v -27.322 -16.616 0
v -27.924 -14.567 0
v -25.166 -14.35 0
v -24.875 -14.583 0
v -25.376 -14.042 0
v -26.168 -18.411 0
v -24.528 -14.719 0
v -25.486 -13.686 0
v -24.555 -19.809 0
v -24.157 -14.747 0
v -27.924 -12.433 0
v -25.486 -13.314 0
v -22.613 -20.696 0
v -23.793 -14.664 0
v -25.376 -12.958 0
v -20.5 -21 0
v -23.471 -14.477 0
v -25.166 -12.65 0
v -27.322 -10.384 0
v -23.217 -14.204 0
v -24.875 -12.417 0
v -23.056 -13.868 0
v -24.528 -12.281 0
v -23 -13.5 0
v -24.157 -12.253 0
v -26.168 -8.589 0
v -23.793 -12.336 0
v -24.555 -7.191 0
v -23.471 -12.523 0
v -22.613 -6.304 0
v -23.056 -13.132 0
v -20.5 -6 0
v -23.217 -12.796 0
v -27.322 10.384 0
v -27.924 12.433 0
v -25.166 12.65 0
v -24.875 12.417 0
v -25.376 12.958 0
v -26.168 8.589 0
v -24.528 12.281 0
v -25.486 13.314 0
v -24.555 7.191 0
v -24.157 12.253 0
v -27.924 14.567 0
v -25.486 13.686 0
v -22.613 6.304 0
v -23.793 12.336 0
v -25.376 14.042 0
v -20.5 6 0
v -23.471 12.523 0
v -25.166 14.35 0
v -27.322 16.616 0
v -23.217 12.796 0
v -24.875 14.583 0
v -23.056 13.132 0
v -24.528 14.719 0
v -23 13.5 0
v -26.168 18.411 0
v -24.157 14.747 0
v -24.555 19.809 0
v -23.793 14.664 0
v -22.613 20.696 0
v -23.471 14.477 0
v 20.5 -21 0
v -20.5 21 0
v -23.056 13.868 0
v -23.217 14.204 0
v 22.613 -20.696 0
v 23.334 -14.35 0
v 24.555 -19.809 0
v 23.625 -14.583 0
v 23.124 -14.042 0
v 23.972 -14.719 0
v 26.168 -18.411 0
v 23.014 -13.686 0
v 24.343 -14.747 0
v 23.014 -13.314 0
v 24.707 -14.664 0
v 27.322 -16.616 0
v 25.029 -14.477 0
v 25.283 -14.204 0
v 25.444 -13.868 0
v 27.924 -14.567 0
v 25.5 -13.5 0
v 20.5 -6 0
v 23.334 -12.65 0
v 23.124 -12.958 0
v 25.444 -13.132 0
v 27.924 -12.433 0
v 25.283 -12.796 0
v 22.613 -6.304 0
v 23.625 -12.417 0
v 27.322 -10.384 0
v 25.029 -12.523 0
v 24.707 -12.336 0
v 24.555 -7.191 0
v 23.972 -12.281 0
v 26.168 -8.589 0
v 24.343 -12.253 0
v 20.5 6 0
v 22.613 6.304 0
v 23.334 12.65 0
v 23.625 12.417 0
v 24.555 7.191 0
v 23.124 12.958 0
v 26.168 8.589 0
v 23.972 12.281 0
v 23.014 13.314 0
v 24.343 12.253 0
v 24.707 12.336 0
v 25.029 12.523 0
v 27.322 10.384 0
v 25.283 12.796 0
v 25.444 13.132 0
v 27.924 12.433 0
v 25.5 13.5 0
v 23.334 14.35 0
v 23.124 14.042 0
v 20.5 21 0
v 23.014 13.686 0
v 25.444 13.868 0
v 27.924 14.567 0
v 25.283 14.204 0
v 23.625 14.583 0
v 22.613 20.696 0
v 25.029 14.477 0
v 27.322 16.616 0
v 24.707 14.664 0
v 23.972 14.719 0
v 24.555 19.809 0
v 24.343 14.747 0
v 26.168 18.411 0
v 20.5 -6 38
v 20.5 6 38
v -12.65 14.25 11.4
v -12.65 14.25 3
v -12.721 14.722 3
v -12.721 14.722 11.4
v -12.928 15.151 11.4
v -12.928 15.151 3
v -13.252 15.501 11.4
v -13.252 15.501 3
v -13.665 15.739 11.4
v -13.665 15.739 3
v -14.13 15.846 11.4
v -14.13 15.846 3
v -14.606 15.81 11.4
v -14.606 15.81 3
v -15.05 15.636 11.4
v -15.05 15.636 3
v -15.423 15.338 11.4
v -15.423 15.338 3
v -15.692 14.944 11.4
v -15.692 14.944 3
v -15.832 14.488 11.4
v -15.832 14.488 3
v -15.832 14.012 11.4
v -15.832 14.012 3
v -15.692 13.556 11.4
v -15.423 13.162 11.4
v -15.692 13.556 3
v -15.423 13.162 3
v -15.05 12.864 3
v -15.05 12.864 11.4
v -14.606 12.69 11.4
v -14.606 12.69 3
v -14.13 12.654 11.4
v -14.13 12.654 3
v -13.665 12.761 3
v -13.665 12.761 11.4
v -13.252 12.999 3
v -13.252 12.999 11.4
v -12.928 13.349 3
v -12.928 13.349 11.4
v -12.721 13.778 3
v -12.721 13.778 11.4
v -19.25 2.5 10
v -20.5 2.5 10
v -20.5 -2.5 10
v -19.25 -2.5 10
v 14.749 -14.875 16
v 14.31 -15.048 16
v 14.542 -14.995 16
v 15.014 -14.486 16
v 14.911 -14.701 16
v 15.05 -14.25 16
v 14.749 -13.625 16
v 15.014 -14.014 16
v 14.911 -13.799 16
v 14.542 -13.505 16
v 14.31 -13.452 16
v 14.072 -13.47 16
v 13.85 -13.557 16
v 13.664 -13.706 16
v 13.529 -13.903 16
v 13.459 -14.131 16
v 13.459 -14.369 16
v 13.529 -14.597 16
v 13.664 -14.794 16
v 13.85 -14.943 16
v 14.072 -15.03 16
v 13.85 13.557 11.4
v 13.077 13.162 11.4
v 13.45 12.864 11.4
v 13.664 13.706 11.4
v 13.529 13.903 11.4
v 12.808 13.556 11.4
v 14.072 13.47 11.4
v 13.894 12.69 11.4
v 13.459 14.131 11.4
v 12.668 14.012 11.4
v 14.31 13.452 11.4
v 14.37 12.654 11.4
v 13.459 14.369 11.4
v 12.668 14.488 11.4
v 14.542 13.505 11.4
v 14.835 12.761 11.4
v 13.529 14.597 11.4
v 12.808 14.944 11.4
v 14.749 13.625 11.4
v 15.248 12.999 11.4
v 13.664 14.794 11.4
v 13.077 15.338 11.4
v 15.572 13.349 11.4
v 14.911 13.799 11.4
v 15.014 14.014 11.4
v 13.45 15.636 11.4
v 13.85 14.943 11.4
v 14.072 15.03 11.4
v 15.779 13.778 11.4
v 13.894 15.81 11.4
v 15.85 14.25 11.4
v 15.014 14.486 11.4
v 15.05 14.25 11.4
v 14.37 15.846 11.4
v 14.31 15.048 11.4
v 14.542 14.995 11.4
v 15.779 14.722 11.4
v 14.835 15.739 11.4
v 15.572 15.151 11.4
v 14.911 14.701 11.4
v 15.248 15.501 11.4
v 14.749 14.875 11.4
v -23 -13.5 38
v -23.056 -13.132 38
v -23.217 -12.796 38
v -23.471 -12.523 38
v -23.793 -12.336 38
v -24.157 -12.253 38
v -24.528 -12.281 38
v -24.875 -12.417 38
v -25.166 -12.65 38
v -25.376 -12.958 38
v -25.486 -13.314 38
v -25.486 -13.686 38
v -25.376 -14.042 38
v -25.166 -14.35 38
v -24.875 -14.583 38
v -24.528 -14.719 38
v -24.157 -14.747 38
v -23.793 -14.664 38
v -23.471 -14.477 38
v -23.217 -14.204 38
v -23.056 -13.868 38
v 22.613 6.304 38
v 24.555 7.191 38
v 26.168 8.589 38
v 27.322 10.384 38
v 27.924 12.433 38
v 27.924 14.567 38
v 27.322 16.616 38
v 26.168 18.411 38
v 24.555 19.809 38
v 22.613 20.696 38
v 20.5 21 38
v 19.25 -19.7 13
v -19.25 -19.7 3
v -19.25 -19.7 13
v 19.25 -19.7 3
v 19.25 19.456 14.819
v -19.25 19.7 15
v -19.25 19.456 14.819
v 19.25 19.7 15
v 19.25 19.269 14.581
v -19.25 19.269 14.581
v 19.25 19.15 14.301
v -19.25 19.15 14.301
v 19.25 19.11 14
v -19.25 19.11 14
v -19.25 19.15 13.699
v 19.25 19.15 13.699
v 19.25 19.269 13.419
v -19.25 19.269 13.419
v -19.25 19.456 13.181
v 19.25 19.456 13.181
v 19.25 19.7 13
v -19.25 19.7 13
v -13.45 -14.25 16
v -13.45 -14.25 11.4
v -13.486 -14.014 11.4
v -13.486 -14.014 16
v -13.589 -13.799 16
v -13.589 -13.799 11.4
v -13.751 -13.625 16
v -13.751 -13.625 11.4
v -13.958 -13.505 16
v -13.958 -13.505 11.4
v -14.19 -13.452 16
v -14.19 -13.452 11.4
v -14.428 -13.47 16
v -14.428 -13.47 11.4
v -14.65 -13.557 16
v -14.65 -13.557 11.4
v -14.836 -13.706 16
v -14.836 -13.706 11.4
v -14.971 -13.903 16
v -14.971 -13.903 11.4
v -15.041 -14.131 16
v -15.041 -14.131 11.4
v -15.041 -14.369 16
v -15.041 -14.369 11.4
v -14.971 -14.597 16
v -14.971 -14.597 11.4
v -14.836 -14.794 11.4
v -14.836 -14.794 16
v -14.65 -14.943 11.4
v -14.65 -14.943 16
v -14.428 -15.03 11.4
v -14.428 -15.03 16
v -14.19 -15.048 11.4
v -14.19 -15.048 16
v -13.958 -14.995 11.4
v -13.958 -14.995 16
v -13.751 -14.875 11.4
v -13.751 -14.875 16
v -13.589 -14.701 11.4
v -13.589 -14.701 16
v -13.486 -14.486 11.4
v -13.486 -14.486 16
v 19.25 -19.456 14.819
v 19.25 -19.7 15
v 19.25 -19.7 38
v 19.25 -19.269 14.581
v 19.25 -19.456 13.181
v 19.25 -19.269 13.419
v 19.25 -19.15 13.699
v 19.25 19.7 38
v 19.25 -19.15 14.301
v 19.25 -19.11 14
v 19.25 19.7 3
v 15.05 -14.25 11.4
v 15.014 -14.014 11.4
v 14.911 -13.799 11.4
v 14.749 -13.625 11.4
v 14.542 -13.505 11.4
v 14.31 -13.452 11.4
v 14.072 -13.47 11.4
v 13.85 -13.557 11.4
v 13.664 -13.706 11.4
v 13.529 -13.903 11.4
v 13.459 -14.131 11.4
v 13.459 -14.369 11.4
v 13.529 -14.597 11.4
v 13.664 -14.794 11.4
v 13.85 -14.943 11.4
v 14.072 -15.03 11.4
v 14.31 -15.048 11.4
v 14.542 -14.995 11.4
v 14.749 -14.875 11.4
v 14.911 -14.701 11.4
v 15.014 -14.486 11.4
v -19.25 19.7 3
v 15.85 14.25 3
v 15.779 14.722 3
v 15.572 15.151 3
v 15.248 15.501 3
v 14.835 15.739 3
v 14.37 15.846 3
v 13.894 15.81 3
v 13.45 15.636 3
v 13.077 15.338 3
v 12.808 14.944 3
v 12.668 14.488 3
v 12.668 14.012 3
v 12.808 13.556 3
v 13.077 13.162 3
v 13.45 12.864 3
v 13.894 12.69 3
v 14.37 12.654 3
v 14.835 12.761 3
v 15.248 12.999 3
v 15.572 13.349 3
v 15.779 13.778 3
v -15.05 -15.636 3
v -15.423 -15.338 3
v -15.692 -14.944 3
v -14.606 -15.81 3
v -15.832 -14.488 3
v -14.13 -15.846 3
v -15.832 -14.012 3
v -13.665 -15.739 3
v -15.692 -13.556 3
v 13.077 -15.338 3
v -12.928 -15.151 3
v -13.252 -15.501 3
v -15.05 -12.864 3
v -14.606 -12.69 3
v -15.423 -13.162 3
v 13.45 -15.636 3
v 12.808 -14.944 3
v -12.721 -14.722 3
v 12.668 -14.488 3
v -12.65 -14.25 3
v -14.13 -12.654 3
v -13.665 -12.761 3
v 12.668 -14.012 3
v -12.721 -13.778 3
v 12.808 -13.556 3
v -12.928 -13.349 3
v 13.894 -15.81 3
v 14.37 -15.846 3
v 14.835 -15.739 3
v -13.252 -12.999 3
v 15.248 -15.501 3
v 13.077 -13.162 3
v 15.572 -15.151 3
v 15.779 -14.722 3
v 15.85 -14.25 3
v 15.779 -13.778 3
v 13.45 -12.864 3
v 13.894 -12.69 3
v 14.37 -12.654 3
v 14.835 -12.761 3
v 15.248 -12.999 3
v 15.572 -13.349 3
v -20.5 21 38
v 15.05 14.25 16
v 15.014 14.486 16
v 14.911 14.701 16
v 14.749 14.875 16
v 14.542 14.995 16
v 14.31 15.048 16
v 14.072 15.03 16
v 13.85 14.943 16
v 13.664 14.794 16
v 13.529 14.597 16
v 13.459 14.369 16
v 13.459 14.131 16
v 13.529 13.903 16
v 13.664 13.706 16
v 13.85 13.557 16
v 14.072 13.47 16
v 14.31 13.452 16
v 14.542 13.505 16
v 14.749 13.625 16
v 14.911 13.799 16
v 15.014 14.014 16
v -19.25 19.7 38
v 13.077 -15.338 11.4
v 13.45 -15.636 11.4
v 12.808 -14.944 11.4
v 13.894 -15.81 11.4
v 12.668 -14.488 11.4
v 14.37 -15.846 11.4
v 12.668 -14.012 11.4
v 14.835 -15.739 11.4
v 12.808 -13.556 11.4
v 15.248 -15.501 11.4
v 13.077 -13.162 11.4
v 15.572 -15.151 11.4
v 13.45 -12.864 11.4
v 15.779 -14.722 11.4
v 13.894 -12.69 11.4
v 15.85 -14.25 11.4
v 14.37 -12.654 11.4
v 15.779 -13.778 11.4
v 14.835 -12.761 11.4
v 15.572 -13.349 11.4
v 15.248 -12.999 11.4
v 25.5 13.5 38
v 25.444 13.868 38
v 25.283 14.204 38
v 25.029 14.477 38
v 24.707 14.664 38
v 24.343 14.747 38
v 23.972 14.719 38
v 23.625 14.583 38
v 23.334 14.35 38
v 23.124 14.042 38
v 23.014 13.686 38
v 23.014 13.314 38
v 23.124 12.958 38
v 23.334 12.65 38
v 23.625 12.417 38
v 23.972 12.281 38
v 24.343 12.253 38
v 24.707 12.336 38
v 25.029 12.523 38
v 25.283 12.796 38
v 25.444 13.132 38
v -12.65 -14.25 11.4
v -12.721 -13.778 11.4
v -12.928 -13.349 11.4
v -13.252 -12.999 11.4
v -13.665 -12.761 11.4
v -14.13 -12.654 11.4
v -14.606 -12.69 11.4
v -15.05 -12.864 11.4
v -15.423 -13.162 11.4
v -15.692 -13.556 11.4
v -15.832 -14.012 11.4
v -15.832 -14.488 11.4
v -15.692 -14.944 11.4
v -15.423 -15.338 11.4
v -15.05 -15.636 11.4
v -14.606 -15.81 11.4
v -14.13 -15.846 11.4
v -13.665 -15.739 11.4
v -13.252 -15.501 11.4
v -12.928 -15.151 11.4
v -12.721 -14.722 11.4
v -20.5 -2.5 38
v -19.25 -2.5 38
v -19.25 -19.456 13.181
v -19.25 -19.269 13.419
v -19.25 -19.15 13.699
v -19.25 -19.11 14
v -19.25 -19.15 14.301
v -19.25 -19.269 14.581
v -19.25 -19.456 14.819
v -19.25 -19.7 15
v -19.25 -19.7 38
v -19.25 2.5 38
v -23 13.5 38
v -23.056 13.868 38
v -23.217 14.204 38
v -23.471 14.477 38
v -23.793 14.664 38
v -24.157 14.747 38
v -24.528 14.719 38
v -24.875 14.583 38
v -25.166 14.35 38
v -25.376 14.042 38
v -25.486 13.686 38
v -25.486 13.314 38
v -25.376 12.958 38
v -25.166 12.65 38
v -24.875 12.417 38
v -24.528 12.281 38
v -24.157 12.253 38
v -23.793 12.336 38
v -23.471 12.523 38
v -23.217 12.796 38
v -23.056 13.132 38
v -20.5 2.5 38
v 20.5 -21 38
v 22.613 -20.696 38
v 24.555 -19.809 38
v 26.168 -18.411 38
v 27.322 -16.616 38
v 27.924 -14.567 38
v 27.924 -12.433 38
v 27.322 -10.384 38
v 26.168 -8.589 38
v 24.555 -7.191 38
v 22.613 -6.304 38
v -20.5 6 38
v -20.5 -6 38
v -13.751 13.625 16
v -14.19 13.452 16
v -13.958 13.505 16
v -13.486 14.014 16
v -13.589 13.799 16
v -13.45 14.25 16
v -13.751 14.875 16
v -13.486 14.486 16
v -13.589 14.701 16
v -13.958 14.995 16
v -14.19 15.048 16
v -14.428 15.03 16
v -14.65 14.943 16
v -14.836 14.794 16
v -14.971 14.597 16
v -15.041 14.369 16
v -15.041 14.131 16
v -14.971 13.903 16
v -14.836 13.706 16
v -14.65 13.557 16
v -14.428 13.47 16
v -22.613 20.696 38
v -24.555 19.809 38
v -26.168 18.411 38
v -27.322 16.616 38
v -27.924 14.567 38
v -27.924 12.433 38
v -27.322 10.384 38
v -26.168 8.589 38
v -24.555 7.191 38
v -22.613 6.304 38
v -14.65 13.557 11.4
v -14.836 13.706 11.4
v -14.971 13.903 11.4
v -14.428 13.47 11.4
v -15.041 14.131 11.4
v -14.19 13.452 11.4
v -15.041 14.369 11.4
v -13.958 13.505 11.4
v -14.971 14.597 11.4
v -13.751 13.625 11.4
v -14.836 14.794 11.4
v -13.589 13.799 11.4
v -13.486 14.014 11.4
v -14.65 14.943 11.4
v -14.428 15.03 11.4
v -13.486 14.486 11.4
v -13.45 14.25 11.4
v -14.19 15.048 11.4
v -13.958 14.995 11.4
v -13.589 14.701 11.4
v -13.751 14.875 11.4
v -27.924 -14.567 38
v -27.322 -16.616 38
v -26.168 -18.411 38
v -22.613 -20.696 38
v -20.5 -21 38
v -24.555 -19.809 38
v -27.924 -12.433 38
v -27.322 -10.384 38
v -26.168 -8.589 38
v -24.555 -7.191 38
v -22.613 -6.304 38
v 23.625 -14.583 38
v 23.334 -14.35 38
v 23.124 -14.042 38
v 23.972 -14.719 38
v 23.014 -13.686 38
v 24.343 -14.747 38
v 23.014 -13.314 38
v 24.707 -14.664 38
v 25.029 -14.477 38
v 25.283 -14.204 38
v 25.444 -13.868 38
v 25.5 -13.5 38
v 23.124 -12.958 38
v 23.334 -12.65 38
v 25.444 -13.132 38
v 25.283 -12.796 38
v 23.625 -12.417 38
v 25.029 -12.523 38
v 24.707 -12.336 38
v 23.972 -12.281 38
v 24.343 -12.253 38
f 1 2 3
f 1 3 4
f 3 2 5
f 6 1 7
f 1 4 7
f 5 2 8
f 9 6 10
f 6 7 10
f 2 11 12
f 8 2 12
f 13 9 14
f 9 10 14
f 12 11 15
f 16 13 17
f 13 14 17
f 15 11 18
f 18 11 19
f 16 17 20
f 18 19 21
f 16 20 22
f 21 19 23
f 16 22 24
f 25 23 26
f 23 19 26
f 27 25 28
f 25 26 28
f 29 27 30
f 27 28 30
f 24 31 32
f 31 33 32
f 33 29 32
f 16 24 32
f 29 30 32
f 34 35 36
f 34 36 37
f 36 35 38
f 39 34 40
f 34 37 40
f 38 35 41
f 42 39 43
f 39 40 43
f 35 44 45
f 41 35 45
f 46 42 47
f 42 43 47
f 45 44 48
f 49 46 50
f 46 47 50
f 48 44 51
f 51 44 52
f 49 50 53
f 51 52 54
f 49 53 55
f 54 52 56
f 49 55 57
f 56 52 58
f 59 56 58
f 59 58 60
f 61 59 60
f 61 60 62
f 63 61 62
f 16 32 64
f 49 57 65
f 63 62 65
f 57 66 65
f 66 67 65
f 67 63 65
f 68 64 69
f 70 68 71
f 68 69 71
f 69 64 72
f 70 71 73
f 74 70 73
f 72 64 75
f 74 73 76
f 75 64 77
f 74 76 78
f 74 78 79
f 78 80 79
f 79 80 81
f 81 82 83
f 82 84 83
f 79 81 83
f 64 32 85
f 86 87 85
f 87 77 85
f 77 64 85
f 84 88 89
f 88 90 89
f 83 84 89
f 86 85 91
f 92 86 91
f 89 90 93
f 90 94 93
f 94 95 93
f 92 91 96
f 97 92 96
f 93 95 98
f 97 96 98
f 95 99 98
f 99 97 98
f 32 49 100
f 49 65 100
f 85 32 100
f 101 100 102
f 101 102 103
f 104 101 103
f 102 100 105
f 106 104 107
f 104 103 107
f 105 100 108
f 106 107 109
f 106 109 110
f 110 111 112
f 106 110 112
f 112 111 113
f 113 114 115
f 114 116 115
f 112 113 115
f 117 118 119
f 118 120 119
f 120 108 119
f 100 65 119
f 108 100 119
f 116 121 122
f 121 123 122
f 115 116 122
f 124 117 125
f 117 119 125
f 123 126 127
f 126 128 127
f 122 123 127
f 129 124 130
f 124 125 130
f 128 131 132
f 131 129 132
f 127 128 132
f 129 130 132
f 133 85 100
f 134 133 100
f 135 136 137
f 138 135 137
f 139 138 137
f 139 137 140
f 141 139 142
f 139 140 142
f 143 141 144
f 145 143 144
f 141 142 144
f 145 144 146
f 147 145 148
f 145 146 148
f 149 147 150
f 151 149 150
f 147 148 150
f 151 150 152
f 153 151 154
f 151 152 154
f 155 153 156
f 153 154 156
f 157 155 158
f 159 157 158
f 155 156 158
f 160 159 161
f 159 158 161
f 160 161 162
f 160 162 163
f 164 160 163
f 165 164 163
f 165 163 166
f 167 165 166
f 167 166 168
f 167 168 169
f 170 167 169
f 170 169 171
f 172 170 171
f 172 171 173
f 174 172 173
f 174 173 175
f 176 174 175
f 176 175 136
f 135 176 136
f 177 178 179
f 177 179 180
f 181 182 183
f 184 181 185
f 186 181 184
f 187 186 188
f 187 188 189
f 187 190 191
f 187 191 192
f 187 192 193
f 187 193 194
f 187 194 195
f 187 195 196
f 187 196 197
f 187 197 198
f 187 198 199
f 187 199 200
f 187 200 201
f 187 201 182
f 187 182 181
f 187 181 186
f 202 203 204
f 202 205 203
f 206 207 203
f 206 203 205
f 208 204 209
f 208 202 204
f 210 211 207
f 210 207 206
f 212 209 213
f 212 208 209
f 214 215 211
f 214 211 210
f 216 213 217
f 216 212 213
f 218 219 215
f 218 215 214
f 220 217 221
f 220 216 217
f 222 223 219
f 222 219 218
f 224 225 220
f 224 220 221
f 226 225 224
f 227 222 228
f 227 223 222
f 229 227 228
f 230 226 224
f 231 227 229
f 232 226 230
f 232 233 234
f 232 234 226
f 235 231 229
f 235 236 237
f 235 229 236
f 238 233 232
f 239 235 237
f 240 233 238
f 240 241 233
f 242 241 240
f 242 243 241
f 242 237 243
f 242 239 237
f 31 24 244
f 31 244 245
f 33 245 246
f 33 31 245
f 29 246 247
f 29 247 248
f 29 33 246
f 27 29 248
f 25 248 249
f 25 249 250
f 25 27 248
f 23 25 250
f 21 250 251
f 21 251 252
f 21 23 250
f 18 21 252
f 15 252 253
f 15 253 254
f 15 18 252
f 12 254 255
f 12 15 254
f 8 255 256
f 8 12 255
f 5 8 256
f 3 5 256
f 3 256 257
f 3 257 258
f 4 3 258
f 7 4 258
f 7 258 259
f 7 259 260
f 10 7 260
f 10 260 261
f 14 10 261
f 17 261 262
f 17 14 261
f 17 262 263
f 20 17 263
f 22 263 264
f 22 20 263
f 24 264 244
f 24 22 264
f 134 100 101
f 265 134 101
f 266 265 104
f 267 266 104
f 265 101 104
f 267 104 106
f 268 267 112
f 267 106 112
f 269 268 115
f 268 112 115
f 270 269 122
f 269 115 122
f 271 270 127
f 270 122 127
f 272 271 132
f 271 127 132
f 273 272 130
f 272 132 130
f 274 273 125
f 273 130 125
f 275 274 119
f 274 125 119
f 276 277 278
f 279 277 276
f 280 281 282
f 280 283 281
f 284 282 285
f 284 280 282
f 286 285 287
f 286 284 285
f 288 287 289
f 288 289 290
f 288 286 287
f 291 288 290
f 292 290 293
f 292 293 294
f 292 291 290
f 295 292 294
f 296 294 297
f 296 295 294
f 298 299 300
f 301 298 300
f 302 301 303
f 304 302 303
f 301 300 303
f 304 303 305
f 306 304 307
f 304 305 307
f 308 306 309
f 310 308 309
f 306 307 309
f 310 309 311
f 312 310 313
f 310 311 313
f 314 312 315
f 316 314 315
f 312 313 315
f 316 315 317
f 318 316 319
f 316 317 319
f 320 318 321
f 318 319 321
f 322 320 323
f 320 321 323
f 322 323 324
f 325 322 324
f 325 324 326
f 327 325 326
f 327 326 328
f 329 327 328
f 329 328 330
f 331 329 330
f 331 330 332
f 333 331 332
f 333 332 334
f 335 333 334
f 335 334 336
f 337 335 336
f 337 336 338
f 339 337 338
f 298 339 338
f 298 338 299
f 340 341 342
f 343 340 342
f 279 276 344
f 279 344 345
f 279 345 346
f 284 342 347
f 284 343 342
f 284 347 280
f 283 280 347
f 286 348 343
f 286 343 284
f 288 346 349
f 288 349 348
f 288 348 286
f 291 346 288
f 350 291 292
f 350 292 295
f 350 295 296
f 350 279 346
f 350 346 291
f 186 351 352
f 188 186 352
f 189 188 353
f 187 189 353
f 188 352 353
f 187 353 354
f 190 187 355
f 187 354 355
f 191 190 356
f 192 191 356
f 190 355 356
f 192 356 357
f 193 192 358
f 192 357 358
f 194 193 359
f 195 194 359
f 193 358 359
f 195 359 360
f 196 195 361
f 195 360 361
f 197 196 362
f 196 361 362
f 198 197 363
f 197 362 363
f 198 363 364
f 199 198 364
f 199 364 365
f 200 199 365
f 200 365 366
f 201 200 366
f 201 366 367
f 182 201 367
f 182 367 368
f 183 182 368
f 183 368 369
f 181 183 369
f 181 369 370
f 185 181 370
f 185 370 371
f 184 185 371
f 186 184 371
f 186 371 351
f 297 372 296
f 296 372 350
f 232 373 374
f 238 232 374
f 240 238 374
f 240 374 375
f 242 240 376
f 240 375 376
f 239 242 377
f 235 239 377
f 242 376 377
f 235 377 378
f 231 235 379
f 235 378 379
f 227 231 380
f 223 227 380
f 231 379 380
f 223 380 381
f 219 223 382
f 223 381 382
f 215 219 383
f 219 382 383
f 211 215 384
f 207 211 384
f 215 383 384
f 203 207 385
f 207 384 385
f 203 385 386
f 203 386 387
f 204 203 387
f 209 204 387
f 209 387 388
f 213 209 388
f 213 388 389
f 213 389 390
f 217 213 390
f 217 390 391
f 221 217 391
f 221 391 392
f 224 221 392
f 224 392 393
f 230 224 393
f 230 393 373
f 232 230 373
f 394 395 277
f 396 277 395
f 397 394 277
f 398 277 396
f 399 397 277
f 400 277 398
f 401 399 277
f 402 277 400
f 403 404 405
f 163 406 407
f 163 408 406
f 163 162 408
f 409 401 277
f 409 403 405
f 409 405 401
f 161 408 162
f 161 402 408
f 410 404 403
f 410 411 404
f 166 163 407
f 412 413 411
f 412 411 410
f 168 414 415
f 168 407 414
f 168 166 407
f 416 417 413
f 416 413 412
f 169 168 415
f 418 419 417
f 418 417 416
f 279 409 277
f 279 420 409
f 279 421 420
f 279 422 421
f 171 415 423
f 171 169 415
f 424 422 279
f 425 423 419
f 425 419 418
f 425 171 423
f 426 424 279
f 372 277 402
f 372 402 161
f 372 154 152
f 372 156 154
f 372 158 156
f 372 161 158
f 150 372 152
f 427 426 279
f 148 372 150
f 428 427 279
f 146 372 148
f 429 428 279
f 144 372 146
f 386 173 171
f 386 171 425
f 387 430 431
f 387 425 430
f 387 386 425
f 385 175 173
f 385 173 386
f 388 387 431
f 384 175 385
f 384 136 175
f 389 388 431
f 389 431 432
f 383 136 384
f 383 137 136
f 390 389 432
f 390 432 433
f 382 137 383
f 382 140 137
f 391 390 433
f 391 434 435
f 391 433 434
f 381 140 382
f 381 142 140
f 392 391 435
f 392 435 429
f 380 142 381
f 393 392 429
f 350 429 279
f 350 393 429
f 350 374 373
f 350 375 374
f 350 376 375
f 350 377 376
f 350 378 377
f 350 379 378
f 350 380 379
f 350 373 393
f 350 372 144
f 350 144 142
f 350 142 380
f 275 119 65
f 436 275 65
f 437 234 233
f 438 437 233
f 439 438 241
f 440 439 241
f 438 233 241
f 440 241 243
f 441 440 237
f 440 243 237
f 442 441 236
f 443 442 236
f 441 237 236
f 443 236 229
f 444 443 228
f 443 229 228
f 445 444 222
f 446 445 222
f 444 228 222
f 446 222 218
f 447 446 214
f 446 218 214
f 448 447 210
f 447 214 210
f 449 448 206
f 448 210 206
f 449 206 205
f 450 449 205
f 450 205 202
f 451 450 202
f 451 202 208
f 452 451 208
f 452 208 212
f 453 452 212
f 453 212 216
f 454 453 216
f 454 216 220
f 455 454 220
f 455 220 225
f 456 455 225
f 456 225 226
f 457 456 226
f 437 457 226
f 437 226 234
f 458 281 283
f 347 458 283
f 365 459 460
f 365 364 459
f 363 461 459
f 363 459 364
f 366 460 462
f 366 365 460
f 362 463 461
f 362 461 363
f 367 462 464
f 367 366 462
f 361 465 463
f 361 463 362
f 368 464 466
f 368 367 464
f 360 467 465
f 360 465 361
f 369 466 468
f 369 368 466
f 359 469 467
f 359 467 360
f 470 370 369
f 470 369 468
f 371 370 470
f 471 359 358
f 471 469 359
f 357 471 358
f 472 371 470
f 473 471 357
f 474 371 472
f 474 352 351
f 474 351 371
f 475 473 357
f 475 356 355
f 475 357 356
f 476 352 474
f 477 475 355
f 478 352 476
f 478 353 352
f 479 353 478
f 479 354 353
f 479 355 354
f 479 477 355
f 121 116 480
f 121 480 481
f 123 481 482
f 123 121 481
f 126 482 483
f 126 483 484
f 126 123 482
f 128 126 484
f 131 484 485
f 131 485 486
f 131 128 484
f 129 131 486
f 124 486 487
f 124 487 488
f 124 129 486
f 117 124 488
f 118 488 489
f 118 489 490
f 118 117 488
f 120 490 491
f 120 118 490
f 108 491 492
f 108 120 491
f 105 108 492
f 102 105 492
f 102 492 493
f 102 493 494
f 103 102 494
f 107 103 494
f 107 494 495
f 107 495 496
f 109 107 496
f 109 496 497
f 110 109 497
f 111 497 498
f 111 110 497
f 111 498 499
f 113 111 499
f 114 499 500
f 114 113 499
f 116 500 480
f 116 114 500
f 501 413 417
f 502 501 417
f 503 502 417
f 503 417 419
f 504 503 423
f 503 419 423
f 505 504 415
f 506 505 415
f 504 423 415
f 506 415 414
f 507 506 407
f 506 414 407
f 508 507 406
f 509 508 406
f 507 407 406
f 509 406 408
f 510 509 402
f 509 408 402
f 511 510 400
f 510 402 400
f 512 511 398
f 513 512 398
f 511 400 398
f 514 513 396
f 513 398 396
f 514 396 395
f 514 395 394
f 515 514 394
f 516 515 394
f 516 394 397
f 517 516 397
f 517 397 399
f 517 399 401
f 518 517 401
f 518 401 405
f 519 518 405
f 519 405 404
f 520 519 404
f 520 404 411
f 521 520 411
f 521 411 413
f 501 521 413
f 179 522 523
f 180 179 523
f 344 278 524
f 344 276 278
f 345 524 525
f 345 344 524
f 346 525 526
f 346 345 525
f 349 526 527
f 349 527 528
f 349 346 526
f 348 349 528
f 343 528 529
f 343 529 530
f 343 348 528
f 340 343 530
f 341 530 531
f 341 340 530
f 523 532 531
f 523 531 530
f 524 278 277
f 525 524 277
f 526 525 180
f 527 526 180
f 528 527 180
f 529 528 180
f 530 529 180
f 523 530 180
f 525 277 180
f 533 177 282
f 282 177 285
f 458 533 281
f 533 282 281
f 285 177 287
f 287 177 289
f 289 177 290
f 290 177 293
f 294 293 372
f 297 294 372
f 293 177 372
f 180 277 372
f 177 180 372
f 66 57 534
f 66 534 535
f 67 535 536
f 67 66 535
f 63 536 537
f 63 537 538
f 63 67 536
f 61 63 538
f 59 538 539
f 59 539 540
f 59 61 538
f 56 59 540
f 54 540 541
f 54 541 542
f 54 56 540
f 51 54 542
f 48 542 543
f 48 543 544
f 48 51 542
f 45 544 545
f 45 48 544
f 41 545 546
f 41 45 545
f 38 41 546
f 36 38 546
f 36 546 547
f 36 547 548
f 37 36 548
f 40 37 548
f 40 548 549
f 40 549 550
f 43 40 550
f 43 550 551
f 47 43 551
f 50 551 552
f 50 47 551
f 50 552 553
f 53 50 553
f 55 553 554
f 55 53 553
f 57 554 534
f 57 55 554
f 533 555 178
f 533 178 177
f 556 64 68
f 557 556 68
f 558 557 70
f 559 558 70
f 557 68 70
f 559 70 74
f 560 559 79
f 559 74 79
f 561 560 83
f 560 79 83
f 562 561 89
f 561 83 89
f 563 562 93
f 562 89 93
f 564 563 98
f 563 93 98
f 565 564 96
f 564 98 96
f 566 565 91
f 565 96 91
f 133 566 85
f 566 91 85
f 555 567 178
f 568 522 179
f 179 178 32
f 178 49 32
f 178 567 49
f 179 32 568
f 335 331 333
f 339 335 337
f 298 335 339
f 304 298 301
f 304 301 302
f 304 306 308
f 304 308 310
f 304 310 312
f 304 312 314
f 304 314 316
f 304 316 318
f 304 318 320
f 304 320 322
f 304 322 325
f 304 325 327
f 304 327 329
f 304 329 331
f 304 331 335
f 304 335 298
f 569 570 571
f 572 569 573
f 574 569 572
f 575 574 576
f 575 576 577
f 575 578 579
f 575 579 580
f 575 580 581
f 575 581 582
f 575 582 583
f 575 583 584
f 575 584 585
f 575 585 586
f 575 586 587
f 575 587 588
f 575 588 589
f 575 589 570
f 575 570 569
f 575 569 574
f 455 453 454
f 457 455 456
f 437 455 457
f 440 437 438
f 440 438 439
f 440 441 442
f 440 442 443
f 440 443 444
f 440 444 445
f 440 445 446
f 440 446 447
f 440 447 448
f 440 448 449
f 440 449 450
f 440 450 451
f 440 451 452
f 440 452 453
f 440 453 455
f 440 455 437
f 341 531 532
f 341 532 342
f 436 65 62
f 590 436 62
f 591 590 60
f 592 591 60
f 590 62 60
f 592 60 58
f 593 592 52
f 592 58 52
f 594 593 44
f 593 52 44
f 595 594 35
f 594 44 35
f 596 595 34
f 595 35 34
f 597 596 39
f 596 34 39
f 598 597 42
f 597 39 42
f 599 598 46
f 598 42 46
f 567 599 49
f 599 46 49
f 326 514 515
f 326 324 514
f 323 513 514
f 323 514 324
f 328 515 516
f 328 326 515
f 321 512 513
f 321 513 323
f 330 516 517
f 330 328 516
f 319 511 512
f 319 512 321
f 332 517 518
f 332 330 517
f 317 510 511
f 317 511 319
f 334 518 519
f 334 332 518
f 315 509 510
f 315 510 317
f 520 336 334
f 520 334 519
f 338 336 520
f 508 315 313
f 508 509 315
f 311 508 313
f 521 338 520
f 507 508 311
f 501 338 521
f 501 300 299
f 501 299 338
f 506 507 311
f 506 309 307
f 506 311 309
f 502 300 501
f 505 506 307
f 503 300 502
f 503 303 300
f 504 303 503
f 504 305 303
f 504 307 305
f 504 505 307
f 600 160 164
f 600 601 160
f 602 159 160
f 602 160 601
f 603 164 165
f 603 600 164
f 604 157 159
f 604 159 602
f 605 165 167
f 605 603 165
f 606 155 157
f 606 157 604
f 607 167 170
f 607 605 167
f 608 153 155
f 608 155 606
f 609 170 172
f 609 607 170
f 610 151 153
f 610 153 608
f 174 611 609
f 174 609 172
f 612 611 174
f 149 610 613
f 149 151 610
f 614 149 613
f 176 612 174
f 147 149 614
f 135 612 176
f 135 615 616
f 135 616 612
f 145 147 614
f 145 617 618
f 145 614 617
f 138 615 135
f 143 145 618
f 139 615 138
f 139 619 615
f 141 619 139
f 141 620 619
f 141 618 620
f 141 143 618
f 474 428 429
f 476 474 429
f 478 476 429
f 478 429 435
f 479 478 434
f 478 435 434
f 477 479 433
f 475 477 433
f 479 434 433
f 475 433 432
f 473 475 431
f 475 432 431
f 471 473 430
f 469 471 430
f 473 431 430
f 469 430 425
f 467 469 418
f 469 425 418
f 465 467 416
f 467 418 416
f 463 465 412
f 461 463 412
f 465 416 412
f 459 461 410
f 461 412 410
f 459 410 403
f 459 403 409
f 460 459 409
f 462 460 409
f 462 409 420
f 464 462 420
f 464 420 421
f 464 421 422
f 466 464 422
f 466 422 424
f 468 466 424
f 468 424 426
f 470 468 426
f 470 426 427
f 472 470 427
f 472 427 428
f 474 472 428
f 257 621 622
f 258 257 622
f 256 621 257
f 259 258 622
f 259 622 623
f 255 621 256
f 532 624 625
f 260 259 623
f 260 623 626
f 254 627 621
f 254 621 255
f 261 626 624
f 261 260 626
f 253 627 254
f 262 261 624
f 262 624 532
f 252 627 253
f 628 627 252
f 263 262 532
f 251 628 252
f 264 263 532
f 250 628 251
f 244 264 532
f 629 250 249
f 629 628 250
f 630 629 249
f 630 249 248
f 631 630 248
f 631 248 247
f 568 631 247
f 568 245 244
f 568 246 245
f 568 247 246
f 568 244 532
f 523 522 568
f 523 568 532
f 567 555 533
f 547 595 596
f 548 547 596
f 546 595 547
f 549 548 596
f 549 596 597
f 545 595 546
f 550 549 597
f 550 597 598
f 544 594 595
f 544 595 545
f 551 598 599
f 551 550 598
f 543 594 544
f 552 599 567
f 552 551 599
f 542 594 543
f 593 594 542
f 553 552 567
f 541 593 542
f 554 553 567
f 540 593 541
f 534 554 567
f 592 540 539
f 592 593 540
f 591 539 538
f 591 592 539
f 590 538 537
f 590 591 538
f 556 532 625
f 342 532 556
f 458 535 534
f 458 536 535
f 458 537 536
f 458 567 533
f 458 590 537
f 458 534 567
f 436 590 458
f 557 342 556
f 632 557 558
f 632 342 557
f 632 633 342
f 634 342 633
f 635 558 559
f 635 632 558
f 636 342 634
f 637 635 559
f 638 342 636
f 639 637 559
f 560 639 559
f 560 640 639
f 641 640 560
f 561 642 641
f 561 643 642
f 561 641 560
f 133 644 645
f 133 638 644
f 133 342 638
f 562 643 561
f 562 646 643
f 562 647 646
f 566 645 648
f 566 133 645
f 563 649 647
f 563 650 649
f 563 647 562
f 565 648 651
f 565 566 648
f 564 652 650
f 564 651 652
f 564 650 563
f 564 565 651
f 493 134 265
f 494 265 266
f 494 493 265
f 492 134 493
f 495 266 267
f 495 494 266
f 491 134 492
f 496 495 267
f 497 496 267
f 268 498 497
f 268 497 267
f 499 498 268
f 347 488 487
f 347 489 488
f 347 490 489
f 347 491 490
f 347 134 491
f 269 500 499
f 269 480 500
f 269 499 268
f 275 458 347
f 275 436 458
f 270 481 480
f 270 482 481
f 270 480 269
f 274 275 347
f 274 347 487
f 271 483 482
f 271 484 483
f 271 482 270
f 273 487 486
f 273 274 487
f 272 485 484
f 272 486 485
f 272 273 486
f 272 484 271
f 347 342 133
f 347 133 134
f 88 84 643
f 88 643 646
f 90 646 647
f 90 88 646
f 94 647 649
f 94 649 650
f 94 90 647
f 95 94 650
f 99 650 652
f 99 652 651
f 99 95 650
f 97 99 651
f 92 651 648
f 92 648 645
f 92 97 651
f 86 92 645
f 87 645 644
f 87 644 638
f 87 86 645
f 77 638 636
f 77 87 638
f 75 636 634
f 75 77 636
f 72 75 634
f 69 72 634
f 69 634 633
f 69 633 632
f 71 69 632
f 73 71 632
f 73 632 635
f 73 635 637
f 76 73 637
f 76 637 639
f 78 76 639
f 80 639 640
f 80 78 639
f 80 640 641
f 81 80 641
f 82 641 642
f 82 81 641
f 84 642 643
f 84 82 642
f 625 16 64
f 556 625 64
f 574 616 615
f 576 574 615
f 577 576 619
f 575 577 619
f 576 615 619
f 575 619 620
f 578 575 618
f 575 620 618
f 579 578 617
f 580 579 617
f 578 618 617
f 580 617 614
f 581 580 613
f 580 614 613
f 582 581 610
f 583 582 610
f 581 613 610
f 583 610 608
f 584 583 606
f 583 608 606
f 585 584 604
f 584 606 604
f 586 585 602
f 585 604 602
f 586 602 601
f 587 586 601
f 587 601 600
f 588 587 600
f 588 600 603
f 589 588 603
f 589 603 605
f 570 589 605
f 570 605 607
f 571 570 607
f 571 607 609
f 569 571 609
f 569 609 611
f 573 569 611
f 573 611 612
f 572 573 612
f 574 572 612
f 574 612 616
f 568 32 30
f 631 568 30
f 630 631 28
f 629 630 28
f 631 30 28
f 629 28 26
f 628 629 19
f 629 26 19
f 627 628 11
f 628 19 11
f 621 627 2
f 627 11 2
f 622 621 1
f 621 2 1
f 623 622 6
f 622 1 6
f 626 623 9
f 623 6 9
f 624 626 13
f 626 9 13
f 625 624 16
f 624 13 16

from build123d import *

# Parameters (mm, degrees)
F0_W           = 38.5
F0_H           = 39.4
F0_R           = 1.6
F1_DEPTH       = 3
F0_R_2         = 0.8
F2_DEPTH       = 11.4
F3_DEPTH       = 16
F0_R_3         = 1.25
F4_DEPTH       = 38
F5_W           = 1.25
F5_H           = 5
F6_DEPTH       = 28
F10_DEPTH      = 19.25
F10_DEPTH_BACK = 19.25


with BuildPart() as f1:
    # F0 (on Top) → F1 (new body)
    with BuildSketch(Plane.XY):
        Rectangle(F0_W, F0_H)
        with Locations((-14.25, -14.25)):
            Circle(F0_R, mode=Mode.SUBTRACT)
        with Locations((14.25, -14.25)):
            Circle(F0_R, mode=Mode.SUBTRACT)
        with Locations((-14.25, 14.25)):
            Circle(F0_R, mode=Mode.SUBTRACT)
        with Locations((14.25, 14.25)):
            Circle(F0_R, mode=Mode.SUBTRACT)
    extrude(amount=F1_DEPTH)

    # F0 (on Top) → F2 (join)
    with BuildSketch(Plane.XY):
        with Locations((-14.25, 14.25)):
            Circle(F0_R)
        with Locations((-14.25, 14.25)):
            Circle(F0_R_2, mode=Mode.SUBTRACT)
        with Locations((-14.25, -14.25)):
            Circle(F0_R)
        with Locations((-14.25, -14.25)):
            Circle(F0_R_2, mode=Mode.SUBTRACT)
        with Locations((14.25, -14.25)):
            Circle(F0_R)
        with Locations((14.25, -14.25)):
            Circle(F0_R_2, mode=Mode.SUBTRACT)
        with Locations((14.25, 14.25)):
            Circle(F0_R)
        with Locations((14.25, 14.25)):
            Circle(F0_R_2, mode=Mode.SUBTRACT)
    extrude(amount=F2_DEPTH)

    # F0 (on Top) → F3 (join)
    with BuildSketch(Plane.XY):
        with Locations((-14.25, 14.25)):
            Circle(F0_R_2)
        with Locations((-14.25, -14.25)):
            Circle(F0_R_2)
        with Locations((14.25, -14.25)):
            Circle(F0_R_2)
        with Locations((14.25, 14.25)):
            Circle(F0_R_2)
    extrude(amount=F3_DEPTH)

    # F0 (on Top) → F4 (join)
    with BuildSketch(Plane.XY):
        Polygon((20.5, 21), (-20.5, 21), (-20.5, 6), (-20.5, -6), (-20.5, -21), (20.5, -21), (20.5, -6), (20.5, 6), align=None)
        Rectangle(F0_W, F0_H, mode=Mode.SUBTRACT)
        with BuildLine():
            Line((-20.5, -21), (-20.5, -6))
            ThreePointArc((-20.5, -6), (-28, -13.5), (-20.5, -21))
        make_face()
        with Locations((-24.25, -13.5)):
            Circle(F0_R_3, mode=Mode.SUBTRACT)
        with BuildLine():
            ThreePointArc((20.5, -21), (28, -13.5), (20.5, -6))
            Line((20.5, -6), (20.5, -21))
        make_face()
        with Locations((24.25, -13.5)):
            Circle(F0_R_3, mode=Mode.SUBTRACT)
        with BuildLine():
            ThreePointArc((20.5, 6), (28, 13.5), (20.5, 21))
            Line((20.5, 21), (20.5, 6))
        make_face()
        with Locations((24.25, 13.5)):
            Circle(F0_R_3, mode=Mode.SUBTRACT)
        with BuildLine():
            Line((-20.5, 6), (-20.5, 21))
            ThreePointArc((-20.5, 21), (-28, 13.5), (-20.5, 6))
        make_face()
        with Locations((-24.25, 13.5)):
            Circle(F0_R_3, mode=Mode.SUBTRACT)
    extrude(amount=F4_DEPTH)

    # F5 (on face) → F6 (cut)
    with BuildSketch(Plane.XY.offset(38)):
        with Locations((-19.875, 0)):
            Rectangle(F5_W, F5_H)
    extrude(amount=-F6_DEPTH, mode=Mode.SUBTRACT)

    # F9 (on Right) → F10 (join, two sides)
    with BuildSketch(Plane.YZ) as f10_sk:
        with BuildLine():
            Line((19.7, 13), (19.7, 15))
            ThreePointArc((19.7, 15), (19.110149, 14), (19.7, 13))
        make_face()
        with BuildLine():
            ThreePointArc((-19.7, 13), (-19.110149, 14), (-19.7, 15))
            Line((-19.7, 15), (-19.7, 13))
        make_face()
    extrude(amount=F10_DEPTH)
    extrude(f10_sk.sketch, amount=-F10_DEPTH_BACK)


solid = f1.part
